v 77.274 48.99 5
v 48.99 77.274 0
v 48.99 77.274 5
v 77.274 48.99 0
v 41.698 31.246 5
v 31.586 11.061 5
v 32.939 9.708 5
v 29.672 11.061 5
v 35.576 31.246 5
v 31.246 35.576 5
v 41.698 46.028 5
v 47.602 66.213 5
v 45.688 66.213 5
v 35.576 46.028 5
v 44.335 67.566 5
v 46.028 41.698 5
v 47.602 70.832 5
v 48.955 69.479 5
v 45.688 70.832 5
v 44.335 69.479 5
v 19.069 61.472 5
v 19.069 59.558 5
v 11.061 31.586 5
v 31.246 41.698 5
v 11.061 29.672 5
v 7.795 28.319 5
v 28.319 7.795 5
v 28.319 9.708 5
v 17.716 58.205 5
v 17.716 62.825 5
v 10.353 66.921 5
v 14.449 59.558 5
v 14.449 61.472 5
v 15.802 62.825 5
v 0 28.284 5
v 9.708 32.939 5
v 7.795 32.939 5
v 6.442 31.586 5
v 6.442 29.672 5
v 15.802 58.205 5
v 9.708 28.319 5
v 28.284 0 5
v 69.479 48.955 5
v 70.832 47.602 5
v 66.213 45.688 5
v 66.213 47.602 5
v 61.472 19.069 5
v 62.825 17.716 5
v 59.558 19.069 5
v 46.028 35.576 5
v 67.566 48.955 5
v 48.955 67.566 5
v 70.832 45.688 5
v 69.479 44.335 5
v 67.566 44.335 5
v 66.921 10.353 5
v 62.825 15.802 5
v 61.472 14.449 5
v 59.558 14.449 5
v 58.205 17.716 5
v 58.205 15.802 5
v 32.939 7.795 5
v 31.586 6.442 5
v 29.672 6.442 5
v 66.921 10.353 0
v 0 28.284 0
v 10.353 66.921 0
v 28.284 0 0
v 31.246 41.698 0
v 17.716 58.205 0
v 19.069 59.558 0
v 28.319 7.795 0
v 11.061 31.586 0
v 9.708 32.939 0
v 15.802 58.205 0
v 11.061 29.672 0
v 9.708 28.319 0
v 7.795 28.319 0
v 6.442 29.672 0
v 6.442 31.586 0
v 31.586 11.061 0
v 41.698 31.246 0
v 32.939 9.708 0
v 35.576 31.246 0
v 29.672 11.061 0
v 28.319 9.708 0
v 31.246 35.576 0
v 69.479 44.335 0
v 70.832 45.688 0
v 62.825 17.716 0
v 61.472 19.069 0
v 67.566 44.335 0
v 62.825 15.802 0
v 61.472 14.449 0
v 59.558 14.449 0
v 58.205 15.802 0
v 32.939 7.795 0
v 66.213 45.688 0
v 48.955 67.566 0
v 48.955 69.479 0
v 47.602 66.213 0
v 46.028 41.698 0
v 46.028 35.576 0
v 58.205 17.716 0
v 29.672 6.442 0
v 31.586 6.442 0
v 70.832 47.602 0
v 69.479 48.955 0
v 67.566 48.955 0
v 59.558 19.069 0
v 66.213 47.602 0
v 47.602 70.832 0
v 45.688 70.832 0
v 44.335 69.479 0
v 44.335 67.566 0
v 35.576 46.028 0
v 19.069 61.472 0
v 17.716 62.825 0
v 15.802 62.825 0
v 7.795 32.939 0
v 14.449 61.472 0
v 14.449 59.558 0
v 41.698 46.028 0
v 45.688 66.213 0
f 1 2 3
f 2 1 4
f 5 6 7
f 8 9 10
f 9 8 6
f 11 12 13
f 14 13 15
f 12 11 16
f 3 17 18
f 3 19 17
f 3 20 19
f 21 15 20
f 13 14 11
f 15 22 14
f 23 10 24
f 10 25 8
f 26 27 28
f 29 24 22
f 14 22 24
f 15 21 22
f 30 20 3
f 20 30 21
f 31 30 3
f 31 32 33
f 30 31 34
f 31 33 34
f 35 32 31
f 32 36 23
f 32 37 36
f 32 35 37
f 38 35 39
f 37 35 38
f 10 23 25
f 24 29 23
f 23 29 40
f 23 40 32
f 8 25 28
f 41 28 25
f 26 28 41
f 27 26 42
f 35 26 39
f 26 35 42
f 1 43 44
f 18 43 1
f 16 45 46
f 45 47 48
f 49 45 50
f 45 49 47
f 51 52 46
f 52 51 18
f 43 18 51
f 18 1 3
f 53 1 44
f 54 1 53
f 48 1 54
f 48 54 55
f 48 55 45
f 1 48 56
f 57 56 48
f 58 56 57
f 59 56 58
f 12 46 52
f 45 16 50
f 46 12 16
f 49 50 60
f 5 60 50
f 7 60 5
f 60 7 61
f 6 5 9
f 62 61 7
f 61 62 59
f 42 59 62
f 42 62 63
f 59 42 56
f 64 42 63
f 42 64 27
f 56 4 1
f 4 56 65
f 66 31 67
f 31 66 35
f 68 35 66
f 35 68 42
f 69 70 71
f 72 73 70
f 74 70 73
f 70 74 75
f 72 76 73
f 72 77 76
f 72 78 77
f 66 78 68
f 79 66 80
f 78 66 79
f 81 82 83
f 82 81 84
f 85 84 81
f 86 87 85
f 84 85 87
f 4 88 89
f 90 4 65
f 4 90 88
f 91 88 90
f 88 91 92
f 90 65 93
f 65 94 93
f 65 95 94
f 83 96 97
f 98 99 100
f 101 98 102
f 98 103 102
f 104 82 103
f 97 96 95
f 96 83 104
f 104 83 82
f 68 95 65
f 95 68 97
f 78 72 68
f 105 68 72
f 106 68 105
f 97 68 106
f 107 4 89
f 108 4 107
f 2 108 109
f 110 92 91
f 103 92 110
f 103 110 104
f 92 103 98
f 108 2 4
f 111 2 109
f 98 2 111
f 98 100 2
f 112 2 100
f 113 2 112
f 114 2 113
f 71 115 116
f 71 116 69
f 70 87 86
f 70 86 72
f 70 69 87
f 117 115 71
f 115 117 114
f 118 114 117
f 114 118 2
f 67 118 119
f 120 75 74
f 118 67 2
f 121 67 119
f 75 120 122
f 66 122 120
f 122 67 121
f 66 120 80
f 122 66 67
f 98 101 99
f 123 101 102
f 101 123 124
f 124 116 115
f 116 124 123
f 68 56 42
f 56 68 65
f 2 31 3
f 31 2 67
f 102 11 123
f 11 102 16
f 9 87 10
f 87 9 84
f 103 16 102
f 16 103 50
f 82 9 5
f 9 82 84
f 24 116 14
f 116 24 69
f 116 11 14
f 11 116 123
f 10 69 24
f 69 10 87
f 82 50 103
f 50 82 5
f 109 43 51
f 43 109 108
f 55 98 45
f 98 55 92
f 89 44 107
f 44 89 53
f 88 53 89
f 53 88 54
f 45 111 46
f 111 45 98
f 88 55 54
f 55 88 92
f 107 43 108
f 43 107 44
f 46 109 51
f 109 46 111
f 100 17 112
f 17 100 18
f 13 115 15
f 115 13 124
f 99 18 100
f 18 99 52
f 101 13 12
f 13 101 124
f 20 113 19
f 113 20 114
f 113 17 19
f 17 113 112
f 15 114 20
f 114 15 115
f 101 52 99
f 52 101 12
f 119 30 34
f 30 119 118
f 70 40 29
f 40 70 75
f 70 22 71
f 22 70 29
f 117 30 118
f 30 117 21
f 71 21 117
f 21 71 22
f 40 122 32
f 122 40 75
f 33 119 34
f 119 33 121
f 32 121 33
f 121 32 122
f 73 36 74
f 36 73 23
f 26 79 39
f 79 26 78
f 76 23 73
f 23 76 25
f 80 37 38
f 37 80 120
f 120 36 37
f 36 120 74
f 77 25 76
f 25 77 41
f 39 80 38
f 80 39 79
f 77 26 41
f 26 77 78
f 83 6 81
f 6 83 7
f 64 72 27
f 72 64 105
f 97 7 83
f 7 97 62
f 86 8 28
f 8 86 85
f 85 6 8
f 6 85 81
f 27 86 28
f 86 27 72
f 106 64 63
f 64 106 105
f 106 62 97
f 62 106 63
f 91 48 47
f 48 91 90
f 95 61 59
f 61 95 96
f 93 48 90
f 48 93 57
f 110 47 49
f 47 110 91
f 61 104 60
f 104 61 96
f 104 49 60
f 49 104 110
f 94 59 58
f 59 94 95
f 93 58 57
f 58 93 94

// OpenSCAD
$fn = 32;

// ----------------------------------------------------------------------
// Polygon plate: 6-gon R40, 6 bolt windows
// ----------------------------------------------------------------------

// --- parameters (mm) ---
sides = 6;                // number of polygon sides
plate_r = 40;             // circumscribed radius of the polygon
bore_r = 8;               // centre bore radius
bolts = 6;                // number of bolt windows
ring_r = 30.94;           // bolt-circle radius
bolt_r = 2.5;             // bolt window radius
plate_t = 5;              // plate thickness, Z (extrusion height)

plate_d = 2 * plate_r;  // circumscribed diameter
bore_d = 2 * bore_r;  // centre bore diameter
bolt_d = 2 * bolt_r;  // bolt window diameter
ring_d = 2 * ring_r;  // bolt-circle diameter

profile = [[77.274, 48.99], [48.99, 77.274], [10.353, 66.921], [0, 28.284], [28.284, 0], [66.921, 10.353]];  // primary outline, 6 points, counter clockwise
void_1 = [[46.028, 41.698], [41.698, 46.028], [35.576, 46.028], [31.246, 41.698], [31.246, 35.576], [35.576, 31.246], [41.698, 31.246], [46.028, 35.576]];  // centre bore, 8 points
void_2 = [[70.832, 47.602], [69.479, 48.955], [67.566, 48.955], [66.213, 47.602], [66.213, 45.688], [67.566, 44.335], [69.479, 44.335], [70.832, 45.688]];  // bolt window 1, 8 points
void_3 = [[48.955, 69.479], [47.602, 70.832], [45.688, 70.832], [44.335, 69.479], [44.335, 67.566], [45.688, 66.213], [47.602, 66.213], [48.955, 67.566]];  // bolt window 2, 8 points
void_4 = [[19.069, 61.472], [17.716, 62.825], [15.802, 62.825], [14.449, 61.472], [14.449, 59.558], [15.802, 58.205], [17.716, 58.205], [19.069, 59.558]];  // bolt window 3, 8 points
void_5 = [[11.061, 31.586], [9.708, 32.939], [7.795, 32.939], [6.442, 31.586], [6.442, 29.672], [7.795, 28.319], [9.708, 28.319], [11.061, 29.672]];  // bolt window 4, 8 points
void_6 = [[32.939, 9.708], [31.586, 11.061], [29.672, 11.061], [28.319, 9.708], [28.319, 7.795], [29.672, 6.442], [31.586, 6.442], [32.939, 7.795]];  // bolt window 5, 8 points
void_7 = [[62.825, 17.716], [61.472, 19.069], [59.558, 19.069], [58.205, 17.716], [58.205, 15.802], [59.558, 14.449], [61.472, 14.449], [62.825, 15.802]];  // bolt window 6, 8 points

// --- the one profile operation ---
difference() {
  linear_extrude(height = plate_t) polygon(points = profile);
  translate([0, 0, -1])
    linear_extrude(height = plate_t + 2) polygon(points = void_1);
  translate([0, 0, -1])
    linear_extrude(height = plate_t + 2) polygon(points = void_2);
  translate([0, 0, -1])
    linear_extrude(height = plate_t + 2) polygon(points = void_3);
  translate([0, 0, -1])
    linear_extrude(height = plate_t + 2) polygon(points = void_4);
  translate([0, 0, -1])
    linear_extrude(height = plate_t + 2) polygon(points = void_5);
  translate([0, 0, -1])
    linear_extrude(height = plate_t + 2) polygon(points = void_6);
  translate([0, 0, -1])
    linear_extrude(height = plate_t + 2) polygon(points = void_7);
}
